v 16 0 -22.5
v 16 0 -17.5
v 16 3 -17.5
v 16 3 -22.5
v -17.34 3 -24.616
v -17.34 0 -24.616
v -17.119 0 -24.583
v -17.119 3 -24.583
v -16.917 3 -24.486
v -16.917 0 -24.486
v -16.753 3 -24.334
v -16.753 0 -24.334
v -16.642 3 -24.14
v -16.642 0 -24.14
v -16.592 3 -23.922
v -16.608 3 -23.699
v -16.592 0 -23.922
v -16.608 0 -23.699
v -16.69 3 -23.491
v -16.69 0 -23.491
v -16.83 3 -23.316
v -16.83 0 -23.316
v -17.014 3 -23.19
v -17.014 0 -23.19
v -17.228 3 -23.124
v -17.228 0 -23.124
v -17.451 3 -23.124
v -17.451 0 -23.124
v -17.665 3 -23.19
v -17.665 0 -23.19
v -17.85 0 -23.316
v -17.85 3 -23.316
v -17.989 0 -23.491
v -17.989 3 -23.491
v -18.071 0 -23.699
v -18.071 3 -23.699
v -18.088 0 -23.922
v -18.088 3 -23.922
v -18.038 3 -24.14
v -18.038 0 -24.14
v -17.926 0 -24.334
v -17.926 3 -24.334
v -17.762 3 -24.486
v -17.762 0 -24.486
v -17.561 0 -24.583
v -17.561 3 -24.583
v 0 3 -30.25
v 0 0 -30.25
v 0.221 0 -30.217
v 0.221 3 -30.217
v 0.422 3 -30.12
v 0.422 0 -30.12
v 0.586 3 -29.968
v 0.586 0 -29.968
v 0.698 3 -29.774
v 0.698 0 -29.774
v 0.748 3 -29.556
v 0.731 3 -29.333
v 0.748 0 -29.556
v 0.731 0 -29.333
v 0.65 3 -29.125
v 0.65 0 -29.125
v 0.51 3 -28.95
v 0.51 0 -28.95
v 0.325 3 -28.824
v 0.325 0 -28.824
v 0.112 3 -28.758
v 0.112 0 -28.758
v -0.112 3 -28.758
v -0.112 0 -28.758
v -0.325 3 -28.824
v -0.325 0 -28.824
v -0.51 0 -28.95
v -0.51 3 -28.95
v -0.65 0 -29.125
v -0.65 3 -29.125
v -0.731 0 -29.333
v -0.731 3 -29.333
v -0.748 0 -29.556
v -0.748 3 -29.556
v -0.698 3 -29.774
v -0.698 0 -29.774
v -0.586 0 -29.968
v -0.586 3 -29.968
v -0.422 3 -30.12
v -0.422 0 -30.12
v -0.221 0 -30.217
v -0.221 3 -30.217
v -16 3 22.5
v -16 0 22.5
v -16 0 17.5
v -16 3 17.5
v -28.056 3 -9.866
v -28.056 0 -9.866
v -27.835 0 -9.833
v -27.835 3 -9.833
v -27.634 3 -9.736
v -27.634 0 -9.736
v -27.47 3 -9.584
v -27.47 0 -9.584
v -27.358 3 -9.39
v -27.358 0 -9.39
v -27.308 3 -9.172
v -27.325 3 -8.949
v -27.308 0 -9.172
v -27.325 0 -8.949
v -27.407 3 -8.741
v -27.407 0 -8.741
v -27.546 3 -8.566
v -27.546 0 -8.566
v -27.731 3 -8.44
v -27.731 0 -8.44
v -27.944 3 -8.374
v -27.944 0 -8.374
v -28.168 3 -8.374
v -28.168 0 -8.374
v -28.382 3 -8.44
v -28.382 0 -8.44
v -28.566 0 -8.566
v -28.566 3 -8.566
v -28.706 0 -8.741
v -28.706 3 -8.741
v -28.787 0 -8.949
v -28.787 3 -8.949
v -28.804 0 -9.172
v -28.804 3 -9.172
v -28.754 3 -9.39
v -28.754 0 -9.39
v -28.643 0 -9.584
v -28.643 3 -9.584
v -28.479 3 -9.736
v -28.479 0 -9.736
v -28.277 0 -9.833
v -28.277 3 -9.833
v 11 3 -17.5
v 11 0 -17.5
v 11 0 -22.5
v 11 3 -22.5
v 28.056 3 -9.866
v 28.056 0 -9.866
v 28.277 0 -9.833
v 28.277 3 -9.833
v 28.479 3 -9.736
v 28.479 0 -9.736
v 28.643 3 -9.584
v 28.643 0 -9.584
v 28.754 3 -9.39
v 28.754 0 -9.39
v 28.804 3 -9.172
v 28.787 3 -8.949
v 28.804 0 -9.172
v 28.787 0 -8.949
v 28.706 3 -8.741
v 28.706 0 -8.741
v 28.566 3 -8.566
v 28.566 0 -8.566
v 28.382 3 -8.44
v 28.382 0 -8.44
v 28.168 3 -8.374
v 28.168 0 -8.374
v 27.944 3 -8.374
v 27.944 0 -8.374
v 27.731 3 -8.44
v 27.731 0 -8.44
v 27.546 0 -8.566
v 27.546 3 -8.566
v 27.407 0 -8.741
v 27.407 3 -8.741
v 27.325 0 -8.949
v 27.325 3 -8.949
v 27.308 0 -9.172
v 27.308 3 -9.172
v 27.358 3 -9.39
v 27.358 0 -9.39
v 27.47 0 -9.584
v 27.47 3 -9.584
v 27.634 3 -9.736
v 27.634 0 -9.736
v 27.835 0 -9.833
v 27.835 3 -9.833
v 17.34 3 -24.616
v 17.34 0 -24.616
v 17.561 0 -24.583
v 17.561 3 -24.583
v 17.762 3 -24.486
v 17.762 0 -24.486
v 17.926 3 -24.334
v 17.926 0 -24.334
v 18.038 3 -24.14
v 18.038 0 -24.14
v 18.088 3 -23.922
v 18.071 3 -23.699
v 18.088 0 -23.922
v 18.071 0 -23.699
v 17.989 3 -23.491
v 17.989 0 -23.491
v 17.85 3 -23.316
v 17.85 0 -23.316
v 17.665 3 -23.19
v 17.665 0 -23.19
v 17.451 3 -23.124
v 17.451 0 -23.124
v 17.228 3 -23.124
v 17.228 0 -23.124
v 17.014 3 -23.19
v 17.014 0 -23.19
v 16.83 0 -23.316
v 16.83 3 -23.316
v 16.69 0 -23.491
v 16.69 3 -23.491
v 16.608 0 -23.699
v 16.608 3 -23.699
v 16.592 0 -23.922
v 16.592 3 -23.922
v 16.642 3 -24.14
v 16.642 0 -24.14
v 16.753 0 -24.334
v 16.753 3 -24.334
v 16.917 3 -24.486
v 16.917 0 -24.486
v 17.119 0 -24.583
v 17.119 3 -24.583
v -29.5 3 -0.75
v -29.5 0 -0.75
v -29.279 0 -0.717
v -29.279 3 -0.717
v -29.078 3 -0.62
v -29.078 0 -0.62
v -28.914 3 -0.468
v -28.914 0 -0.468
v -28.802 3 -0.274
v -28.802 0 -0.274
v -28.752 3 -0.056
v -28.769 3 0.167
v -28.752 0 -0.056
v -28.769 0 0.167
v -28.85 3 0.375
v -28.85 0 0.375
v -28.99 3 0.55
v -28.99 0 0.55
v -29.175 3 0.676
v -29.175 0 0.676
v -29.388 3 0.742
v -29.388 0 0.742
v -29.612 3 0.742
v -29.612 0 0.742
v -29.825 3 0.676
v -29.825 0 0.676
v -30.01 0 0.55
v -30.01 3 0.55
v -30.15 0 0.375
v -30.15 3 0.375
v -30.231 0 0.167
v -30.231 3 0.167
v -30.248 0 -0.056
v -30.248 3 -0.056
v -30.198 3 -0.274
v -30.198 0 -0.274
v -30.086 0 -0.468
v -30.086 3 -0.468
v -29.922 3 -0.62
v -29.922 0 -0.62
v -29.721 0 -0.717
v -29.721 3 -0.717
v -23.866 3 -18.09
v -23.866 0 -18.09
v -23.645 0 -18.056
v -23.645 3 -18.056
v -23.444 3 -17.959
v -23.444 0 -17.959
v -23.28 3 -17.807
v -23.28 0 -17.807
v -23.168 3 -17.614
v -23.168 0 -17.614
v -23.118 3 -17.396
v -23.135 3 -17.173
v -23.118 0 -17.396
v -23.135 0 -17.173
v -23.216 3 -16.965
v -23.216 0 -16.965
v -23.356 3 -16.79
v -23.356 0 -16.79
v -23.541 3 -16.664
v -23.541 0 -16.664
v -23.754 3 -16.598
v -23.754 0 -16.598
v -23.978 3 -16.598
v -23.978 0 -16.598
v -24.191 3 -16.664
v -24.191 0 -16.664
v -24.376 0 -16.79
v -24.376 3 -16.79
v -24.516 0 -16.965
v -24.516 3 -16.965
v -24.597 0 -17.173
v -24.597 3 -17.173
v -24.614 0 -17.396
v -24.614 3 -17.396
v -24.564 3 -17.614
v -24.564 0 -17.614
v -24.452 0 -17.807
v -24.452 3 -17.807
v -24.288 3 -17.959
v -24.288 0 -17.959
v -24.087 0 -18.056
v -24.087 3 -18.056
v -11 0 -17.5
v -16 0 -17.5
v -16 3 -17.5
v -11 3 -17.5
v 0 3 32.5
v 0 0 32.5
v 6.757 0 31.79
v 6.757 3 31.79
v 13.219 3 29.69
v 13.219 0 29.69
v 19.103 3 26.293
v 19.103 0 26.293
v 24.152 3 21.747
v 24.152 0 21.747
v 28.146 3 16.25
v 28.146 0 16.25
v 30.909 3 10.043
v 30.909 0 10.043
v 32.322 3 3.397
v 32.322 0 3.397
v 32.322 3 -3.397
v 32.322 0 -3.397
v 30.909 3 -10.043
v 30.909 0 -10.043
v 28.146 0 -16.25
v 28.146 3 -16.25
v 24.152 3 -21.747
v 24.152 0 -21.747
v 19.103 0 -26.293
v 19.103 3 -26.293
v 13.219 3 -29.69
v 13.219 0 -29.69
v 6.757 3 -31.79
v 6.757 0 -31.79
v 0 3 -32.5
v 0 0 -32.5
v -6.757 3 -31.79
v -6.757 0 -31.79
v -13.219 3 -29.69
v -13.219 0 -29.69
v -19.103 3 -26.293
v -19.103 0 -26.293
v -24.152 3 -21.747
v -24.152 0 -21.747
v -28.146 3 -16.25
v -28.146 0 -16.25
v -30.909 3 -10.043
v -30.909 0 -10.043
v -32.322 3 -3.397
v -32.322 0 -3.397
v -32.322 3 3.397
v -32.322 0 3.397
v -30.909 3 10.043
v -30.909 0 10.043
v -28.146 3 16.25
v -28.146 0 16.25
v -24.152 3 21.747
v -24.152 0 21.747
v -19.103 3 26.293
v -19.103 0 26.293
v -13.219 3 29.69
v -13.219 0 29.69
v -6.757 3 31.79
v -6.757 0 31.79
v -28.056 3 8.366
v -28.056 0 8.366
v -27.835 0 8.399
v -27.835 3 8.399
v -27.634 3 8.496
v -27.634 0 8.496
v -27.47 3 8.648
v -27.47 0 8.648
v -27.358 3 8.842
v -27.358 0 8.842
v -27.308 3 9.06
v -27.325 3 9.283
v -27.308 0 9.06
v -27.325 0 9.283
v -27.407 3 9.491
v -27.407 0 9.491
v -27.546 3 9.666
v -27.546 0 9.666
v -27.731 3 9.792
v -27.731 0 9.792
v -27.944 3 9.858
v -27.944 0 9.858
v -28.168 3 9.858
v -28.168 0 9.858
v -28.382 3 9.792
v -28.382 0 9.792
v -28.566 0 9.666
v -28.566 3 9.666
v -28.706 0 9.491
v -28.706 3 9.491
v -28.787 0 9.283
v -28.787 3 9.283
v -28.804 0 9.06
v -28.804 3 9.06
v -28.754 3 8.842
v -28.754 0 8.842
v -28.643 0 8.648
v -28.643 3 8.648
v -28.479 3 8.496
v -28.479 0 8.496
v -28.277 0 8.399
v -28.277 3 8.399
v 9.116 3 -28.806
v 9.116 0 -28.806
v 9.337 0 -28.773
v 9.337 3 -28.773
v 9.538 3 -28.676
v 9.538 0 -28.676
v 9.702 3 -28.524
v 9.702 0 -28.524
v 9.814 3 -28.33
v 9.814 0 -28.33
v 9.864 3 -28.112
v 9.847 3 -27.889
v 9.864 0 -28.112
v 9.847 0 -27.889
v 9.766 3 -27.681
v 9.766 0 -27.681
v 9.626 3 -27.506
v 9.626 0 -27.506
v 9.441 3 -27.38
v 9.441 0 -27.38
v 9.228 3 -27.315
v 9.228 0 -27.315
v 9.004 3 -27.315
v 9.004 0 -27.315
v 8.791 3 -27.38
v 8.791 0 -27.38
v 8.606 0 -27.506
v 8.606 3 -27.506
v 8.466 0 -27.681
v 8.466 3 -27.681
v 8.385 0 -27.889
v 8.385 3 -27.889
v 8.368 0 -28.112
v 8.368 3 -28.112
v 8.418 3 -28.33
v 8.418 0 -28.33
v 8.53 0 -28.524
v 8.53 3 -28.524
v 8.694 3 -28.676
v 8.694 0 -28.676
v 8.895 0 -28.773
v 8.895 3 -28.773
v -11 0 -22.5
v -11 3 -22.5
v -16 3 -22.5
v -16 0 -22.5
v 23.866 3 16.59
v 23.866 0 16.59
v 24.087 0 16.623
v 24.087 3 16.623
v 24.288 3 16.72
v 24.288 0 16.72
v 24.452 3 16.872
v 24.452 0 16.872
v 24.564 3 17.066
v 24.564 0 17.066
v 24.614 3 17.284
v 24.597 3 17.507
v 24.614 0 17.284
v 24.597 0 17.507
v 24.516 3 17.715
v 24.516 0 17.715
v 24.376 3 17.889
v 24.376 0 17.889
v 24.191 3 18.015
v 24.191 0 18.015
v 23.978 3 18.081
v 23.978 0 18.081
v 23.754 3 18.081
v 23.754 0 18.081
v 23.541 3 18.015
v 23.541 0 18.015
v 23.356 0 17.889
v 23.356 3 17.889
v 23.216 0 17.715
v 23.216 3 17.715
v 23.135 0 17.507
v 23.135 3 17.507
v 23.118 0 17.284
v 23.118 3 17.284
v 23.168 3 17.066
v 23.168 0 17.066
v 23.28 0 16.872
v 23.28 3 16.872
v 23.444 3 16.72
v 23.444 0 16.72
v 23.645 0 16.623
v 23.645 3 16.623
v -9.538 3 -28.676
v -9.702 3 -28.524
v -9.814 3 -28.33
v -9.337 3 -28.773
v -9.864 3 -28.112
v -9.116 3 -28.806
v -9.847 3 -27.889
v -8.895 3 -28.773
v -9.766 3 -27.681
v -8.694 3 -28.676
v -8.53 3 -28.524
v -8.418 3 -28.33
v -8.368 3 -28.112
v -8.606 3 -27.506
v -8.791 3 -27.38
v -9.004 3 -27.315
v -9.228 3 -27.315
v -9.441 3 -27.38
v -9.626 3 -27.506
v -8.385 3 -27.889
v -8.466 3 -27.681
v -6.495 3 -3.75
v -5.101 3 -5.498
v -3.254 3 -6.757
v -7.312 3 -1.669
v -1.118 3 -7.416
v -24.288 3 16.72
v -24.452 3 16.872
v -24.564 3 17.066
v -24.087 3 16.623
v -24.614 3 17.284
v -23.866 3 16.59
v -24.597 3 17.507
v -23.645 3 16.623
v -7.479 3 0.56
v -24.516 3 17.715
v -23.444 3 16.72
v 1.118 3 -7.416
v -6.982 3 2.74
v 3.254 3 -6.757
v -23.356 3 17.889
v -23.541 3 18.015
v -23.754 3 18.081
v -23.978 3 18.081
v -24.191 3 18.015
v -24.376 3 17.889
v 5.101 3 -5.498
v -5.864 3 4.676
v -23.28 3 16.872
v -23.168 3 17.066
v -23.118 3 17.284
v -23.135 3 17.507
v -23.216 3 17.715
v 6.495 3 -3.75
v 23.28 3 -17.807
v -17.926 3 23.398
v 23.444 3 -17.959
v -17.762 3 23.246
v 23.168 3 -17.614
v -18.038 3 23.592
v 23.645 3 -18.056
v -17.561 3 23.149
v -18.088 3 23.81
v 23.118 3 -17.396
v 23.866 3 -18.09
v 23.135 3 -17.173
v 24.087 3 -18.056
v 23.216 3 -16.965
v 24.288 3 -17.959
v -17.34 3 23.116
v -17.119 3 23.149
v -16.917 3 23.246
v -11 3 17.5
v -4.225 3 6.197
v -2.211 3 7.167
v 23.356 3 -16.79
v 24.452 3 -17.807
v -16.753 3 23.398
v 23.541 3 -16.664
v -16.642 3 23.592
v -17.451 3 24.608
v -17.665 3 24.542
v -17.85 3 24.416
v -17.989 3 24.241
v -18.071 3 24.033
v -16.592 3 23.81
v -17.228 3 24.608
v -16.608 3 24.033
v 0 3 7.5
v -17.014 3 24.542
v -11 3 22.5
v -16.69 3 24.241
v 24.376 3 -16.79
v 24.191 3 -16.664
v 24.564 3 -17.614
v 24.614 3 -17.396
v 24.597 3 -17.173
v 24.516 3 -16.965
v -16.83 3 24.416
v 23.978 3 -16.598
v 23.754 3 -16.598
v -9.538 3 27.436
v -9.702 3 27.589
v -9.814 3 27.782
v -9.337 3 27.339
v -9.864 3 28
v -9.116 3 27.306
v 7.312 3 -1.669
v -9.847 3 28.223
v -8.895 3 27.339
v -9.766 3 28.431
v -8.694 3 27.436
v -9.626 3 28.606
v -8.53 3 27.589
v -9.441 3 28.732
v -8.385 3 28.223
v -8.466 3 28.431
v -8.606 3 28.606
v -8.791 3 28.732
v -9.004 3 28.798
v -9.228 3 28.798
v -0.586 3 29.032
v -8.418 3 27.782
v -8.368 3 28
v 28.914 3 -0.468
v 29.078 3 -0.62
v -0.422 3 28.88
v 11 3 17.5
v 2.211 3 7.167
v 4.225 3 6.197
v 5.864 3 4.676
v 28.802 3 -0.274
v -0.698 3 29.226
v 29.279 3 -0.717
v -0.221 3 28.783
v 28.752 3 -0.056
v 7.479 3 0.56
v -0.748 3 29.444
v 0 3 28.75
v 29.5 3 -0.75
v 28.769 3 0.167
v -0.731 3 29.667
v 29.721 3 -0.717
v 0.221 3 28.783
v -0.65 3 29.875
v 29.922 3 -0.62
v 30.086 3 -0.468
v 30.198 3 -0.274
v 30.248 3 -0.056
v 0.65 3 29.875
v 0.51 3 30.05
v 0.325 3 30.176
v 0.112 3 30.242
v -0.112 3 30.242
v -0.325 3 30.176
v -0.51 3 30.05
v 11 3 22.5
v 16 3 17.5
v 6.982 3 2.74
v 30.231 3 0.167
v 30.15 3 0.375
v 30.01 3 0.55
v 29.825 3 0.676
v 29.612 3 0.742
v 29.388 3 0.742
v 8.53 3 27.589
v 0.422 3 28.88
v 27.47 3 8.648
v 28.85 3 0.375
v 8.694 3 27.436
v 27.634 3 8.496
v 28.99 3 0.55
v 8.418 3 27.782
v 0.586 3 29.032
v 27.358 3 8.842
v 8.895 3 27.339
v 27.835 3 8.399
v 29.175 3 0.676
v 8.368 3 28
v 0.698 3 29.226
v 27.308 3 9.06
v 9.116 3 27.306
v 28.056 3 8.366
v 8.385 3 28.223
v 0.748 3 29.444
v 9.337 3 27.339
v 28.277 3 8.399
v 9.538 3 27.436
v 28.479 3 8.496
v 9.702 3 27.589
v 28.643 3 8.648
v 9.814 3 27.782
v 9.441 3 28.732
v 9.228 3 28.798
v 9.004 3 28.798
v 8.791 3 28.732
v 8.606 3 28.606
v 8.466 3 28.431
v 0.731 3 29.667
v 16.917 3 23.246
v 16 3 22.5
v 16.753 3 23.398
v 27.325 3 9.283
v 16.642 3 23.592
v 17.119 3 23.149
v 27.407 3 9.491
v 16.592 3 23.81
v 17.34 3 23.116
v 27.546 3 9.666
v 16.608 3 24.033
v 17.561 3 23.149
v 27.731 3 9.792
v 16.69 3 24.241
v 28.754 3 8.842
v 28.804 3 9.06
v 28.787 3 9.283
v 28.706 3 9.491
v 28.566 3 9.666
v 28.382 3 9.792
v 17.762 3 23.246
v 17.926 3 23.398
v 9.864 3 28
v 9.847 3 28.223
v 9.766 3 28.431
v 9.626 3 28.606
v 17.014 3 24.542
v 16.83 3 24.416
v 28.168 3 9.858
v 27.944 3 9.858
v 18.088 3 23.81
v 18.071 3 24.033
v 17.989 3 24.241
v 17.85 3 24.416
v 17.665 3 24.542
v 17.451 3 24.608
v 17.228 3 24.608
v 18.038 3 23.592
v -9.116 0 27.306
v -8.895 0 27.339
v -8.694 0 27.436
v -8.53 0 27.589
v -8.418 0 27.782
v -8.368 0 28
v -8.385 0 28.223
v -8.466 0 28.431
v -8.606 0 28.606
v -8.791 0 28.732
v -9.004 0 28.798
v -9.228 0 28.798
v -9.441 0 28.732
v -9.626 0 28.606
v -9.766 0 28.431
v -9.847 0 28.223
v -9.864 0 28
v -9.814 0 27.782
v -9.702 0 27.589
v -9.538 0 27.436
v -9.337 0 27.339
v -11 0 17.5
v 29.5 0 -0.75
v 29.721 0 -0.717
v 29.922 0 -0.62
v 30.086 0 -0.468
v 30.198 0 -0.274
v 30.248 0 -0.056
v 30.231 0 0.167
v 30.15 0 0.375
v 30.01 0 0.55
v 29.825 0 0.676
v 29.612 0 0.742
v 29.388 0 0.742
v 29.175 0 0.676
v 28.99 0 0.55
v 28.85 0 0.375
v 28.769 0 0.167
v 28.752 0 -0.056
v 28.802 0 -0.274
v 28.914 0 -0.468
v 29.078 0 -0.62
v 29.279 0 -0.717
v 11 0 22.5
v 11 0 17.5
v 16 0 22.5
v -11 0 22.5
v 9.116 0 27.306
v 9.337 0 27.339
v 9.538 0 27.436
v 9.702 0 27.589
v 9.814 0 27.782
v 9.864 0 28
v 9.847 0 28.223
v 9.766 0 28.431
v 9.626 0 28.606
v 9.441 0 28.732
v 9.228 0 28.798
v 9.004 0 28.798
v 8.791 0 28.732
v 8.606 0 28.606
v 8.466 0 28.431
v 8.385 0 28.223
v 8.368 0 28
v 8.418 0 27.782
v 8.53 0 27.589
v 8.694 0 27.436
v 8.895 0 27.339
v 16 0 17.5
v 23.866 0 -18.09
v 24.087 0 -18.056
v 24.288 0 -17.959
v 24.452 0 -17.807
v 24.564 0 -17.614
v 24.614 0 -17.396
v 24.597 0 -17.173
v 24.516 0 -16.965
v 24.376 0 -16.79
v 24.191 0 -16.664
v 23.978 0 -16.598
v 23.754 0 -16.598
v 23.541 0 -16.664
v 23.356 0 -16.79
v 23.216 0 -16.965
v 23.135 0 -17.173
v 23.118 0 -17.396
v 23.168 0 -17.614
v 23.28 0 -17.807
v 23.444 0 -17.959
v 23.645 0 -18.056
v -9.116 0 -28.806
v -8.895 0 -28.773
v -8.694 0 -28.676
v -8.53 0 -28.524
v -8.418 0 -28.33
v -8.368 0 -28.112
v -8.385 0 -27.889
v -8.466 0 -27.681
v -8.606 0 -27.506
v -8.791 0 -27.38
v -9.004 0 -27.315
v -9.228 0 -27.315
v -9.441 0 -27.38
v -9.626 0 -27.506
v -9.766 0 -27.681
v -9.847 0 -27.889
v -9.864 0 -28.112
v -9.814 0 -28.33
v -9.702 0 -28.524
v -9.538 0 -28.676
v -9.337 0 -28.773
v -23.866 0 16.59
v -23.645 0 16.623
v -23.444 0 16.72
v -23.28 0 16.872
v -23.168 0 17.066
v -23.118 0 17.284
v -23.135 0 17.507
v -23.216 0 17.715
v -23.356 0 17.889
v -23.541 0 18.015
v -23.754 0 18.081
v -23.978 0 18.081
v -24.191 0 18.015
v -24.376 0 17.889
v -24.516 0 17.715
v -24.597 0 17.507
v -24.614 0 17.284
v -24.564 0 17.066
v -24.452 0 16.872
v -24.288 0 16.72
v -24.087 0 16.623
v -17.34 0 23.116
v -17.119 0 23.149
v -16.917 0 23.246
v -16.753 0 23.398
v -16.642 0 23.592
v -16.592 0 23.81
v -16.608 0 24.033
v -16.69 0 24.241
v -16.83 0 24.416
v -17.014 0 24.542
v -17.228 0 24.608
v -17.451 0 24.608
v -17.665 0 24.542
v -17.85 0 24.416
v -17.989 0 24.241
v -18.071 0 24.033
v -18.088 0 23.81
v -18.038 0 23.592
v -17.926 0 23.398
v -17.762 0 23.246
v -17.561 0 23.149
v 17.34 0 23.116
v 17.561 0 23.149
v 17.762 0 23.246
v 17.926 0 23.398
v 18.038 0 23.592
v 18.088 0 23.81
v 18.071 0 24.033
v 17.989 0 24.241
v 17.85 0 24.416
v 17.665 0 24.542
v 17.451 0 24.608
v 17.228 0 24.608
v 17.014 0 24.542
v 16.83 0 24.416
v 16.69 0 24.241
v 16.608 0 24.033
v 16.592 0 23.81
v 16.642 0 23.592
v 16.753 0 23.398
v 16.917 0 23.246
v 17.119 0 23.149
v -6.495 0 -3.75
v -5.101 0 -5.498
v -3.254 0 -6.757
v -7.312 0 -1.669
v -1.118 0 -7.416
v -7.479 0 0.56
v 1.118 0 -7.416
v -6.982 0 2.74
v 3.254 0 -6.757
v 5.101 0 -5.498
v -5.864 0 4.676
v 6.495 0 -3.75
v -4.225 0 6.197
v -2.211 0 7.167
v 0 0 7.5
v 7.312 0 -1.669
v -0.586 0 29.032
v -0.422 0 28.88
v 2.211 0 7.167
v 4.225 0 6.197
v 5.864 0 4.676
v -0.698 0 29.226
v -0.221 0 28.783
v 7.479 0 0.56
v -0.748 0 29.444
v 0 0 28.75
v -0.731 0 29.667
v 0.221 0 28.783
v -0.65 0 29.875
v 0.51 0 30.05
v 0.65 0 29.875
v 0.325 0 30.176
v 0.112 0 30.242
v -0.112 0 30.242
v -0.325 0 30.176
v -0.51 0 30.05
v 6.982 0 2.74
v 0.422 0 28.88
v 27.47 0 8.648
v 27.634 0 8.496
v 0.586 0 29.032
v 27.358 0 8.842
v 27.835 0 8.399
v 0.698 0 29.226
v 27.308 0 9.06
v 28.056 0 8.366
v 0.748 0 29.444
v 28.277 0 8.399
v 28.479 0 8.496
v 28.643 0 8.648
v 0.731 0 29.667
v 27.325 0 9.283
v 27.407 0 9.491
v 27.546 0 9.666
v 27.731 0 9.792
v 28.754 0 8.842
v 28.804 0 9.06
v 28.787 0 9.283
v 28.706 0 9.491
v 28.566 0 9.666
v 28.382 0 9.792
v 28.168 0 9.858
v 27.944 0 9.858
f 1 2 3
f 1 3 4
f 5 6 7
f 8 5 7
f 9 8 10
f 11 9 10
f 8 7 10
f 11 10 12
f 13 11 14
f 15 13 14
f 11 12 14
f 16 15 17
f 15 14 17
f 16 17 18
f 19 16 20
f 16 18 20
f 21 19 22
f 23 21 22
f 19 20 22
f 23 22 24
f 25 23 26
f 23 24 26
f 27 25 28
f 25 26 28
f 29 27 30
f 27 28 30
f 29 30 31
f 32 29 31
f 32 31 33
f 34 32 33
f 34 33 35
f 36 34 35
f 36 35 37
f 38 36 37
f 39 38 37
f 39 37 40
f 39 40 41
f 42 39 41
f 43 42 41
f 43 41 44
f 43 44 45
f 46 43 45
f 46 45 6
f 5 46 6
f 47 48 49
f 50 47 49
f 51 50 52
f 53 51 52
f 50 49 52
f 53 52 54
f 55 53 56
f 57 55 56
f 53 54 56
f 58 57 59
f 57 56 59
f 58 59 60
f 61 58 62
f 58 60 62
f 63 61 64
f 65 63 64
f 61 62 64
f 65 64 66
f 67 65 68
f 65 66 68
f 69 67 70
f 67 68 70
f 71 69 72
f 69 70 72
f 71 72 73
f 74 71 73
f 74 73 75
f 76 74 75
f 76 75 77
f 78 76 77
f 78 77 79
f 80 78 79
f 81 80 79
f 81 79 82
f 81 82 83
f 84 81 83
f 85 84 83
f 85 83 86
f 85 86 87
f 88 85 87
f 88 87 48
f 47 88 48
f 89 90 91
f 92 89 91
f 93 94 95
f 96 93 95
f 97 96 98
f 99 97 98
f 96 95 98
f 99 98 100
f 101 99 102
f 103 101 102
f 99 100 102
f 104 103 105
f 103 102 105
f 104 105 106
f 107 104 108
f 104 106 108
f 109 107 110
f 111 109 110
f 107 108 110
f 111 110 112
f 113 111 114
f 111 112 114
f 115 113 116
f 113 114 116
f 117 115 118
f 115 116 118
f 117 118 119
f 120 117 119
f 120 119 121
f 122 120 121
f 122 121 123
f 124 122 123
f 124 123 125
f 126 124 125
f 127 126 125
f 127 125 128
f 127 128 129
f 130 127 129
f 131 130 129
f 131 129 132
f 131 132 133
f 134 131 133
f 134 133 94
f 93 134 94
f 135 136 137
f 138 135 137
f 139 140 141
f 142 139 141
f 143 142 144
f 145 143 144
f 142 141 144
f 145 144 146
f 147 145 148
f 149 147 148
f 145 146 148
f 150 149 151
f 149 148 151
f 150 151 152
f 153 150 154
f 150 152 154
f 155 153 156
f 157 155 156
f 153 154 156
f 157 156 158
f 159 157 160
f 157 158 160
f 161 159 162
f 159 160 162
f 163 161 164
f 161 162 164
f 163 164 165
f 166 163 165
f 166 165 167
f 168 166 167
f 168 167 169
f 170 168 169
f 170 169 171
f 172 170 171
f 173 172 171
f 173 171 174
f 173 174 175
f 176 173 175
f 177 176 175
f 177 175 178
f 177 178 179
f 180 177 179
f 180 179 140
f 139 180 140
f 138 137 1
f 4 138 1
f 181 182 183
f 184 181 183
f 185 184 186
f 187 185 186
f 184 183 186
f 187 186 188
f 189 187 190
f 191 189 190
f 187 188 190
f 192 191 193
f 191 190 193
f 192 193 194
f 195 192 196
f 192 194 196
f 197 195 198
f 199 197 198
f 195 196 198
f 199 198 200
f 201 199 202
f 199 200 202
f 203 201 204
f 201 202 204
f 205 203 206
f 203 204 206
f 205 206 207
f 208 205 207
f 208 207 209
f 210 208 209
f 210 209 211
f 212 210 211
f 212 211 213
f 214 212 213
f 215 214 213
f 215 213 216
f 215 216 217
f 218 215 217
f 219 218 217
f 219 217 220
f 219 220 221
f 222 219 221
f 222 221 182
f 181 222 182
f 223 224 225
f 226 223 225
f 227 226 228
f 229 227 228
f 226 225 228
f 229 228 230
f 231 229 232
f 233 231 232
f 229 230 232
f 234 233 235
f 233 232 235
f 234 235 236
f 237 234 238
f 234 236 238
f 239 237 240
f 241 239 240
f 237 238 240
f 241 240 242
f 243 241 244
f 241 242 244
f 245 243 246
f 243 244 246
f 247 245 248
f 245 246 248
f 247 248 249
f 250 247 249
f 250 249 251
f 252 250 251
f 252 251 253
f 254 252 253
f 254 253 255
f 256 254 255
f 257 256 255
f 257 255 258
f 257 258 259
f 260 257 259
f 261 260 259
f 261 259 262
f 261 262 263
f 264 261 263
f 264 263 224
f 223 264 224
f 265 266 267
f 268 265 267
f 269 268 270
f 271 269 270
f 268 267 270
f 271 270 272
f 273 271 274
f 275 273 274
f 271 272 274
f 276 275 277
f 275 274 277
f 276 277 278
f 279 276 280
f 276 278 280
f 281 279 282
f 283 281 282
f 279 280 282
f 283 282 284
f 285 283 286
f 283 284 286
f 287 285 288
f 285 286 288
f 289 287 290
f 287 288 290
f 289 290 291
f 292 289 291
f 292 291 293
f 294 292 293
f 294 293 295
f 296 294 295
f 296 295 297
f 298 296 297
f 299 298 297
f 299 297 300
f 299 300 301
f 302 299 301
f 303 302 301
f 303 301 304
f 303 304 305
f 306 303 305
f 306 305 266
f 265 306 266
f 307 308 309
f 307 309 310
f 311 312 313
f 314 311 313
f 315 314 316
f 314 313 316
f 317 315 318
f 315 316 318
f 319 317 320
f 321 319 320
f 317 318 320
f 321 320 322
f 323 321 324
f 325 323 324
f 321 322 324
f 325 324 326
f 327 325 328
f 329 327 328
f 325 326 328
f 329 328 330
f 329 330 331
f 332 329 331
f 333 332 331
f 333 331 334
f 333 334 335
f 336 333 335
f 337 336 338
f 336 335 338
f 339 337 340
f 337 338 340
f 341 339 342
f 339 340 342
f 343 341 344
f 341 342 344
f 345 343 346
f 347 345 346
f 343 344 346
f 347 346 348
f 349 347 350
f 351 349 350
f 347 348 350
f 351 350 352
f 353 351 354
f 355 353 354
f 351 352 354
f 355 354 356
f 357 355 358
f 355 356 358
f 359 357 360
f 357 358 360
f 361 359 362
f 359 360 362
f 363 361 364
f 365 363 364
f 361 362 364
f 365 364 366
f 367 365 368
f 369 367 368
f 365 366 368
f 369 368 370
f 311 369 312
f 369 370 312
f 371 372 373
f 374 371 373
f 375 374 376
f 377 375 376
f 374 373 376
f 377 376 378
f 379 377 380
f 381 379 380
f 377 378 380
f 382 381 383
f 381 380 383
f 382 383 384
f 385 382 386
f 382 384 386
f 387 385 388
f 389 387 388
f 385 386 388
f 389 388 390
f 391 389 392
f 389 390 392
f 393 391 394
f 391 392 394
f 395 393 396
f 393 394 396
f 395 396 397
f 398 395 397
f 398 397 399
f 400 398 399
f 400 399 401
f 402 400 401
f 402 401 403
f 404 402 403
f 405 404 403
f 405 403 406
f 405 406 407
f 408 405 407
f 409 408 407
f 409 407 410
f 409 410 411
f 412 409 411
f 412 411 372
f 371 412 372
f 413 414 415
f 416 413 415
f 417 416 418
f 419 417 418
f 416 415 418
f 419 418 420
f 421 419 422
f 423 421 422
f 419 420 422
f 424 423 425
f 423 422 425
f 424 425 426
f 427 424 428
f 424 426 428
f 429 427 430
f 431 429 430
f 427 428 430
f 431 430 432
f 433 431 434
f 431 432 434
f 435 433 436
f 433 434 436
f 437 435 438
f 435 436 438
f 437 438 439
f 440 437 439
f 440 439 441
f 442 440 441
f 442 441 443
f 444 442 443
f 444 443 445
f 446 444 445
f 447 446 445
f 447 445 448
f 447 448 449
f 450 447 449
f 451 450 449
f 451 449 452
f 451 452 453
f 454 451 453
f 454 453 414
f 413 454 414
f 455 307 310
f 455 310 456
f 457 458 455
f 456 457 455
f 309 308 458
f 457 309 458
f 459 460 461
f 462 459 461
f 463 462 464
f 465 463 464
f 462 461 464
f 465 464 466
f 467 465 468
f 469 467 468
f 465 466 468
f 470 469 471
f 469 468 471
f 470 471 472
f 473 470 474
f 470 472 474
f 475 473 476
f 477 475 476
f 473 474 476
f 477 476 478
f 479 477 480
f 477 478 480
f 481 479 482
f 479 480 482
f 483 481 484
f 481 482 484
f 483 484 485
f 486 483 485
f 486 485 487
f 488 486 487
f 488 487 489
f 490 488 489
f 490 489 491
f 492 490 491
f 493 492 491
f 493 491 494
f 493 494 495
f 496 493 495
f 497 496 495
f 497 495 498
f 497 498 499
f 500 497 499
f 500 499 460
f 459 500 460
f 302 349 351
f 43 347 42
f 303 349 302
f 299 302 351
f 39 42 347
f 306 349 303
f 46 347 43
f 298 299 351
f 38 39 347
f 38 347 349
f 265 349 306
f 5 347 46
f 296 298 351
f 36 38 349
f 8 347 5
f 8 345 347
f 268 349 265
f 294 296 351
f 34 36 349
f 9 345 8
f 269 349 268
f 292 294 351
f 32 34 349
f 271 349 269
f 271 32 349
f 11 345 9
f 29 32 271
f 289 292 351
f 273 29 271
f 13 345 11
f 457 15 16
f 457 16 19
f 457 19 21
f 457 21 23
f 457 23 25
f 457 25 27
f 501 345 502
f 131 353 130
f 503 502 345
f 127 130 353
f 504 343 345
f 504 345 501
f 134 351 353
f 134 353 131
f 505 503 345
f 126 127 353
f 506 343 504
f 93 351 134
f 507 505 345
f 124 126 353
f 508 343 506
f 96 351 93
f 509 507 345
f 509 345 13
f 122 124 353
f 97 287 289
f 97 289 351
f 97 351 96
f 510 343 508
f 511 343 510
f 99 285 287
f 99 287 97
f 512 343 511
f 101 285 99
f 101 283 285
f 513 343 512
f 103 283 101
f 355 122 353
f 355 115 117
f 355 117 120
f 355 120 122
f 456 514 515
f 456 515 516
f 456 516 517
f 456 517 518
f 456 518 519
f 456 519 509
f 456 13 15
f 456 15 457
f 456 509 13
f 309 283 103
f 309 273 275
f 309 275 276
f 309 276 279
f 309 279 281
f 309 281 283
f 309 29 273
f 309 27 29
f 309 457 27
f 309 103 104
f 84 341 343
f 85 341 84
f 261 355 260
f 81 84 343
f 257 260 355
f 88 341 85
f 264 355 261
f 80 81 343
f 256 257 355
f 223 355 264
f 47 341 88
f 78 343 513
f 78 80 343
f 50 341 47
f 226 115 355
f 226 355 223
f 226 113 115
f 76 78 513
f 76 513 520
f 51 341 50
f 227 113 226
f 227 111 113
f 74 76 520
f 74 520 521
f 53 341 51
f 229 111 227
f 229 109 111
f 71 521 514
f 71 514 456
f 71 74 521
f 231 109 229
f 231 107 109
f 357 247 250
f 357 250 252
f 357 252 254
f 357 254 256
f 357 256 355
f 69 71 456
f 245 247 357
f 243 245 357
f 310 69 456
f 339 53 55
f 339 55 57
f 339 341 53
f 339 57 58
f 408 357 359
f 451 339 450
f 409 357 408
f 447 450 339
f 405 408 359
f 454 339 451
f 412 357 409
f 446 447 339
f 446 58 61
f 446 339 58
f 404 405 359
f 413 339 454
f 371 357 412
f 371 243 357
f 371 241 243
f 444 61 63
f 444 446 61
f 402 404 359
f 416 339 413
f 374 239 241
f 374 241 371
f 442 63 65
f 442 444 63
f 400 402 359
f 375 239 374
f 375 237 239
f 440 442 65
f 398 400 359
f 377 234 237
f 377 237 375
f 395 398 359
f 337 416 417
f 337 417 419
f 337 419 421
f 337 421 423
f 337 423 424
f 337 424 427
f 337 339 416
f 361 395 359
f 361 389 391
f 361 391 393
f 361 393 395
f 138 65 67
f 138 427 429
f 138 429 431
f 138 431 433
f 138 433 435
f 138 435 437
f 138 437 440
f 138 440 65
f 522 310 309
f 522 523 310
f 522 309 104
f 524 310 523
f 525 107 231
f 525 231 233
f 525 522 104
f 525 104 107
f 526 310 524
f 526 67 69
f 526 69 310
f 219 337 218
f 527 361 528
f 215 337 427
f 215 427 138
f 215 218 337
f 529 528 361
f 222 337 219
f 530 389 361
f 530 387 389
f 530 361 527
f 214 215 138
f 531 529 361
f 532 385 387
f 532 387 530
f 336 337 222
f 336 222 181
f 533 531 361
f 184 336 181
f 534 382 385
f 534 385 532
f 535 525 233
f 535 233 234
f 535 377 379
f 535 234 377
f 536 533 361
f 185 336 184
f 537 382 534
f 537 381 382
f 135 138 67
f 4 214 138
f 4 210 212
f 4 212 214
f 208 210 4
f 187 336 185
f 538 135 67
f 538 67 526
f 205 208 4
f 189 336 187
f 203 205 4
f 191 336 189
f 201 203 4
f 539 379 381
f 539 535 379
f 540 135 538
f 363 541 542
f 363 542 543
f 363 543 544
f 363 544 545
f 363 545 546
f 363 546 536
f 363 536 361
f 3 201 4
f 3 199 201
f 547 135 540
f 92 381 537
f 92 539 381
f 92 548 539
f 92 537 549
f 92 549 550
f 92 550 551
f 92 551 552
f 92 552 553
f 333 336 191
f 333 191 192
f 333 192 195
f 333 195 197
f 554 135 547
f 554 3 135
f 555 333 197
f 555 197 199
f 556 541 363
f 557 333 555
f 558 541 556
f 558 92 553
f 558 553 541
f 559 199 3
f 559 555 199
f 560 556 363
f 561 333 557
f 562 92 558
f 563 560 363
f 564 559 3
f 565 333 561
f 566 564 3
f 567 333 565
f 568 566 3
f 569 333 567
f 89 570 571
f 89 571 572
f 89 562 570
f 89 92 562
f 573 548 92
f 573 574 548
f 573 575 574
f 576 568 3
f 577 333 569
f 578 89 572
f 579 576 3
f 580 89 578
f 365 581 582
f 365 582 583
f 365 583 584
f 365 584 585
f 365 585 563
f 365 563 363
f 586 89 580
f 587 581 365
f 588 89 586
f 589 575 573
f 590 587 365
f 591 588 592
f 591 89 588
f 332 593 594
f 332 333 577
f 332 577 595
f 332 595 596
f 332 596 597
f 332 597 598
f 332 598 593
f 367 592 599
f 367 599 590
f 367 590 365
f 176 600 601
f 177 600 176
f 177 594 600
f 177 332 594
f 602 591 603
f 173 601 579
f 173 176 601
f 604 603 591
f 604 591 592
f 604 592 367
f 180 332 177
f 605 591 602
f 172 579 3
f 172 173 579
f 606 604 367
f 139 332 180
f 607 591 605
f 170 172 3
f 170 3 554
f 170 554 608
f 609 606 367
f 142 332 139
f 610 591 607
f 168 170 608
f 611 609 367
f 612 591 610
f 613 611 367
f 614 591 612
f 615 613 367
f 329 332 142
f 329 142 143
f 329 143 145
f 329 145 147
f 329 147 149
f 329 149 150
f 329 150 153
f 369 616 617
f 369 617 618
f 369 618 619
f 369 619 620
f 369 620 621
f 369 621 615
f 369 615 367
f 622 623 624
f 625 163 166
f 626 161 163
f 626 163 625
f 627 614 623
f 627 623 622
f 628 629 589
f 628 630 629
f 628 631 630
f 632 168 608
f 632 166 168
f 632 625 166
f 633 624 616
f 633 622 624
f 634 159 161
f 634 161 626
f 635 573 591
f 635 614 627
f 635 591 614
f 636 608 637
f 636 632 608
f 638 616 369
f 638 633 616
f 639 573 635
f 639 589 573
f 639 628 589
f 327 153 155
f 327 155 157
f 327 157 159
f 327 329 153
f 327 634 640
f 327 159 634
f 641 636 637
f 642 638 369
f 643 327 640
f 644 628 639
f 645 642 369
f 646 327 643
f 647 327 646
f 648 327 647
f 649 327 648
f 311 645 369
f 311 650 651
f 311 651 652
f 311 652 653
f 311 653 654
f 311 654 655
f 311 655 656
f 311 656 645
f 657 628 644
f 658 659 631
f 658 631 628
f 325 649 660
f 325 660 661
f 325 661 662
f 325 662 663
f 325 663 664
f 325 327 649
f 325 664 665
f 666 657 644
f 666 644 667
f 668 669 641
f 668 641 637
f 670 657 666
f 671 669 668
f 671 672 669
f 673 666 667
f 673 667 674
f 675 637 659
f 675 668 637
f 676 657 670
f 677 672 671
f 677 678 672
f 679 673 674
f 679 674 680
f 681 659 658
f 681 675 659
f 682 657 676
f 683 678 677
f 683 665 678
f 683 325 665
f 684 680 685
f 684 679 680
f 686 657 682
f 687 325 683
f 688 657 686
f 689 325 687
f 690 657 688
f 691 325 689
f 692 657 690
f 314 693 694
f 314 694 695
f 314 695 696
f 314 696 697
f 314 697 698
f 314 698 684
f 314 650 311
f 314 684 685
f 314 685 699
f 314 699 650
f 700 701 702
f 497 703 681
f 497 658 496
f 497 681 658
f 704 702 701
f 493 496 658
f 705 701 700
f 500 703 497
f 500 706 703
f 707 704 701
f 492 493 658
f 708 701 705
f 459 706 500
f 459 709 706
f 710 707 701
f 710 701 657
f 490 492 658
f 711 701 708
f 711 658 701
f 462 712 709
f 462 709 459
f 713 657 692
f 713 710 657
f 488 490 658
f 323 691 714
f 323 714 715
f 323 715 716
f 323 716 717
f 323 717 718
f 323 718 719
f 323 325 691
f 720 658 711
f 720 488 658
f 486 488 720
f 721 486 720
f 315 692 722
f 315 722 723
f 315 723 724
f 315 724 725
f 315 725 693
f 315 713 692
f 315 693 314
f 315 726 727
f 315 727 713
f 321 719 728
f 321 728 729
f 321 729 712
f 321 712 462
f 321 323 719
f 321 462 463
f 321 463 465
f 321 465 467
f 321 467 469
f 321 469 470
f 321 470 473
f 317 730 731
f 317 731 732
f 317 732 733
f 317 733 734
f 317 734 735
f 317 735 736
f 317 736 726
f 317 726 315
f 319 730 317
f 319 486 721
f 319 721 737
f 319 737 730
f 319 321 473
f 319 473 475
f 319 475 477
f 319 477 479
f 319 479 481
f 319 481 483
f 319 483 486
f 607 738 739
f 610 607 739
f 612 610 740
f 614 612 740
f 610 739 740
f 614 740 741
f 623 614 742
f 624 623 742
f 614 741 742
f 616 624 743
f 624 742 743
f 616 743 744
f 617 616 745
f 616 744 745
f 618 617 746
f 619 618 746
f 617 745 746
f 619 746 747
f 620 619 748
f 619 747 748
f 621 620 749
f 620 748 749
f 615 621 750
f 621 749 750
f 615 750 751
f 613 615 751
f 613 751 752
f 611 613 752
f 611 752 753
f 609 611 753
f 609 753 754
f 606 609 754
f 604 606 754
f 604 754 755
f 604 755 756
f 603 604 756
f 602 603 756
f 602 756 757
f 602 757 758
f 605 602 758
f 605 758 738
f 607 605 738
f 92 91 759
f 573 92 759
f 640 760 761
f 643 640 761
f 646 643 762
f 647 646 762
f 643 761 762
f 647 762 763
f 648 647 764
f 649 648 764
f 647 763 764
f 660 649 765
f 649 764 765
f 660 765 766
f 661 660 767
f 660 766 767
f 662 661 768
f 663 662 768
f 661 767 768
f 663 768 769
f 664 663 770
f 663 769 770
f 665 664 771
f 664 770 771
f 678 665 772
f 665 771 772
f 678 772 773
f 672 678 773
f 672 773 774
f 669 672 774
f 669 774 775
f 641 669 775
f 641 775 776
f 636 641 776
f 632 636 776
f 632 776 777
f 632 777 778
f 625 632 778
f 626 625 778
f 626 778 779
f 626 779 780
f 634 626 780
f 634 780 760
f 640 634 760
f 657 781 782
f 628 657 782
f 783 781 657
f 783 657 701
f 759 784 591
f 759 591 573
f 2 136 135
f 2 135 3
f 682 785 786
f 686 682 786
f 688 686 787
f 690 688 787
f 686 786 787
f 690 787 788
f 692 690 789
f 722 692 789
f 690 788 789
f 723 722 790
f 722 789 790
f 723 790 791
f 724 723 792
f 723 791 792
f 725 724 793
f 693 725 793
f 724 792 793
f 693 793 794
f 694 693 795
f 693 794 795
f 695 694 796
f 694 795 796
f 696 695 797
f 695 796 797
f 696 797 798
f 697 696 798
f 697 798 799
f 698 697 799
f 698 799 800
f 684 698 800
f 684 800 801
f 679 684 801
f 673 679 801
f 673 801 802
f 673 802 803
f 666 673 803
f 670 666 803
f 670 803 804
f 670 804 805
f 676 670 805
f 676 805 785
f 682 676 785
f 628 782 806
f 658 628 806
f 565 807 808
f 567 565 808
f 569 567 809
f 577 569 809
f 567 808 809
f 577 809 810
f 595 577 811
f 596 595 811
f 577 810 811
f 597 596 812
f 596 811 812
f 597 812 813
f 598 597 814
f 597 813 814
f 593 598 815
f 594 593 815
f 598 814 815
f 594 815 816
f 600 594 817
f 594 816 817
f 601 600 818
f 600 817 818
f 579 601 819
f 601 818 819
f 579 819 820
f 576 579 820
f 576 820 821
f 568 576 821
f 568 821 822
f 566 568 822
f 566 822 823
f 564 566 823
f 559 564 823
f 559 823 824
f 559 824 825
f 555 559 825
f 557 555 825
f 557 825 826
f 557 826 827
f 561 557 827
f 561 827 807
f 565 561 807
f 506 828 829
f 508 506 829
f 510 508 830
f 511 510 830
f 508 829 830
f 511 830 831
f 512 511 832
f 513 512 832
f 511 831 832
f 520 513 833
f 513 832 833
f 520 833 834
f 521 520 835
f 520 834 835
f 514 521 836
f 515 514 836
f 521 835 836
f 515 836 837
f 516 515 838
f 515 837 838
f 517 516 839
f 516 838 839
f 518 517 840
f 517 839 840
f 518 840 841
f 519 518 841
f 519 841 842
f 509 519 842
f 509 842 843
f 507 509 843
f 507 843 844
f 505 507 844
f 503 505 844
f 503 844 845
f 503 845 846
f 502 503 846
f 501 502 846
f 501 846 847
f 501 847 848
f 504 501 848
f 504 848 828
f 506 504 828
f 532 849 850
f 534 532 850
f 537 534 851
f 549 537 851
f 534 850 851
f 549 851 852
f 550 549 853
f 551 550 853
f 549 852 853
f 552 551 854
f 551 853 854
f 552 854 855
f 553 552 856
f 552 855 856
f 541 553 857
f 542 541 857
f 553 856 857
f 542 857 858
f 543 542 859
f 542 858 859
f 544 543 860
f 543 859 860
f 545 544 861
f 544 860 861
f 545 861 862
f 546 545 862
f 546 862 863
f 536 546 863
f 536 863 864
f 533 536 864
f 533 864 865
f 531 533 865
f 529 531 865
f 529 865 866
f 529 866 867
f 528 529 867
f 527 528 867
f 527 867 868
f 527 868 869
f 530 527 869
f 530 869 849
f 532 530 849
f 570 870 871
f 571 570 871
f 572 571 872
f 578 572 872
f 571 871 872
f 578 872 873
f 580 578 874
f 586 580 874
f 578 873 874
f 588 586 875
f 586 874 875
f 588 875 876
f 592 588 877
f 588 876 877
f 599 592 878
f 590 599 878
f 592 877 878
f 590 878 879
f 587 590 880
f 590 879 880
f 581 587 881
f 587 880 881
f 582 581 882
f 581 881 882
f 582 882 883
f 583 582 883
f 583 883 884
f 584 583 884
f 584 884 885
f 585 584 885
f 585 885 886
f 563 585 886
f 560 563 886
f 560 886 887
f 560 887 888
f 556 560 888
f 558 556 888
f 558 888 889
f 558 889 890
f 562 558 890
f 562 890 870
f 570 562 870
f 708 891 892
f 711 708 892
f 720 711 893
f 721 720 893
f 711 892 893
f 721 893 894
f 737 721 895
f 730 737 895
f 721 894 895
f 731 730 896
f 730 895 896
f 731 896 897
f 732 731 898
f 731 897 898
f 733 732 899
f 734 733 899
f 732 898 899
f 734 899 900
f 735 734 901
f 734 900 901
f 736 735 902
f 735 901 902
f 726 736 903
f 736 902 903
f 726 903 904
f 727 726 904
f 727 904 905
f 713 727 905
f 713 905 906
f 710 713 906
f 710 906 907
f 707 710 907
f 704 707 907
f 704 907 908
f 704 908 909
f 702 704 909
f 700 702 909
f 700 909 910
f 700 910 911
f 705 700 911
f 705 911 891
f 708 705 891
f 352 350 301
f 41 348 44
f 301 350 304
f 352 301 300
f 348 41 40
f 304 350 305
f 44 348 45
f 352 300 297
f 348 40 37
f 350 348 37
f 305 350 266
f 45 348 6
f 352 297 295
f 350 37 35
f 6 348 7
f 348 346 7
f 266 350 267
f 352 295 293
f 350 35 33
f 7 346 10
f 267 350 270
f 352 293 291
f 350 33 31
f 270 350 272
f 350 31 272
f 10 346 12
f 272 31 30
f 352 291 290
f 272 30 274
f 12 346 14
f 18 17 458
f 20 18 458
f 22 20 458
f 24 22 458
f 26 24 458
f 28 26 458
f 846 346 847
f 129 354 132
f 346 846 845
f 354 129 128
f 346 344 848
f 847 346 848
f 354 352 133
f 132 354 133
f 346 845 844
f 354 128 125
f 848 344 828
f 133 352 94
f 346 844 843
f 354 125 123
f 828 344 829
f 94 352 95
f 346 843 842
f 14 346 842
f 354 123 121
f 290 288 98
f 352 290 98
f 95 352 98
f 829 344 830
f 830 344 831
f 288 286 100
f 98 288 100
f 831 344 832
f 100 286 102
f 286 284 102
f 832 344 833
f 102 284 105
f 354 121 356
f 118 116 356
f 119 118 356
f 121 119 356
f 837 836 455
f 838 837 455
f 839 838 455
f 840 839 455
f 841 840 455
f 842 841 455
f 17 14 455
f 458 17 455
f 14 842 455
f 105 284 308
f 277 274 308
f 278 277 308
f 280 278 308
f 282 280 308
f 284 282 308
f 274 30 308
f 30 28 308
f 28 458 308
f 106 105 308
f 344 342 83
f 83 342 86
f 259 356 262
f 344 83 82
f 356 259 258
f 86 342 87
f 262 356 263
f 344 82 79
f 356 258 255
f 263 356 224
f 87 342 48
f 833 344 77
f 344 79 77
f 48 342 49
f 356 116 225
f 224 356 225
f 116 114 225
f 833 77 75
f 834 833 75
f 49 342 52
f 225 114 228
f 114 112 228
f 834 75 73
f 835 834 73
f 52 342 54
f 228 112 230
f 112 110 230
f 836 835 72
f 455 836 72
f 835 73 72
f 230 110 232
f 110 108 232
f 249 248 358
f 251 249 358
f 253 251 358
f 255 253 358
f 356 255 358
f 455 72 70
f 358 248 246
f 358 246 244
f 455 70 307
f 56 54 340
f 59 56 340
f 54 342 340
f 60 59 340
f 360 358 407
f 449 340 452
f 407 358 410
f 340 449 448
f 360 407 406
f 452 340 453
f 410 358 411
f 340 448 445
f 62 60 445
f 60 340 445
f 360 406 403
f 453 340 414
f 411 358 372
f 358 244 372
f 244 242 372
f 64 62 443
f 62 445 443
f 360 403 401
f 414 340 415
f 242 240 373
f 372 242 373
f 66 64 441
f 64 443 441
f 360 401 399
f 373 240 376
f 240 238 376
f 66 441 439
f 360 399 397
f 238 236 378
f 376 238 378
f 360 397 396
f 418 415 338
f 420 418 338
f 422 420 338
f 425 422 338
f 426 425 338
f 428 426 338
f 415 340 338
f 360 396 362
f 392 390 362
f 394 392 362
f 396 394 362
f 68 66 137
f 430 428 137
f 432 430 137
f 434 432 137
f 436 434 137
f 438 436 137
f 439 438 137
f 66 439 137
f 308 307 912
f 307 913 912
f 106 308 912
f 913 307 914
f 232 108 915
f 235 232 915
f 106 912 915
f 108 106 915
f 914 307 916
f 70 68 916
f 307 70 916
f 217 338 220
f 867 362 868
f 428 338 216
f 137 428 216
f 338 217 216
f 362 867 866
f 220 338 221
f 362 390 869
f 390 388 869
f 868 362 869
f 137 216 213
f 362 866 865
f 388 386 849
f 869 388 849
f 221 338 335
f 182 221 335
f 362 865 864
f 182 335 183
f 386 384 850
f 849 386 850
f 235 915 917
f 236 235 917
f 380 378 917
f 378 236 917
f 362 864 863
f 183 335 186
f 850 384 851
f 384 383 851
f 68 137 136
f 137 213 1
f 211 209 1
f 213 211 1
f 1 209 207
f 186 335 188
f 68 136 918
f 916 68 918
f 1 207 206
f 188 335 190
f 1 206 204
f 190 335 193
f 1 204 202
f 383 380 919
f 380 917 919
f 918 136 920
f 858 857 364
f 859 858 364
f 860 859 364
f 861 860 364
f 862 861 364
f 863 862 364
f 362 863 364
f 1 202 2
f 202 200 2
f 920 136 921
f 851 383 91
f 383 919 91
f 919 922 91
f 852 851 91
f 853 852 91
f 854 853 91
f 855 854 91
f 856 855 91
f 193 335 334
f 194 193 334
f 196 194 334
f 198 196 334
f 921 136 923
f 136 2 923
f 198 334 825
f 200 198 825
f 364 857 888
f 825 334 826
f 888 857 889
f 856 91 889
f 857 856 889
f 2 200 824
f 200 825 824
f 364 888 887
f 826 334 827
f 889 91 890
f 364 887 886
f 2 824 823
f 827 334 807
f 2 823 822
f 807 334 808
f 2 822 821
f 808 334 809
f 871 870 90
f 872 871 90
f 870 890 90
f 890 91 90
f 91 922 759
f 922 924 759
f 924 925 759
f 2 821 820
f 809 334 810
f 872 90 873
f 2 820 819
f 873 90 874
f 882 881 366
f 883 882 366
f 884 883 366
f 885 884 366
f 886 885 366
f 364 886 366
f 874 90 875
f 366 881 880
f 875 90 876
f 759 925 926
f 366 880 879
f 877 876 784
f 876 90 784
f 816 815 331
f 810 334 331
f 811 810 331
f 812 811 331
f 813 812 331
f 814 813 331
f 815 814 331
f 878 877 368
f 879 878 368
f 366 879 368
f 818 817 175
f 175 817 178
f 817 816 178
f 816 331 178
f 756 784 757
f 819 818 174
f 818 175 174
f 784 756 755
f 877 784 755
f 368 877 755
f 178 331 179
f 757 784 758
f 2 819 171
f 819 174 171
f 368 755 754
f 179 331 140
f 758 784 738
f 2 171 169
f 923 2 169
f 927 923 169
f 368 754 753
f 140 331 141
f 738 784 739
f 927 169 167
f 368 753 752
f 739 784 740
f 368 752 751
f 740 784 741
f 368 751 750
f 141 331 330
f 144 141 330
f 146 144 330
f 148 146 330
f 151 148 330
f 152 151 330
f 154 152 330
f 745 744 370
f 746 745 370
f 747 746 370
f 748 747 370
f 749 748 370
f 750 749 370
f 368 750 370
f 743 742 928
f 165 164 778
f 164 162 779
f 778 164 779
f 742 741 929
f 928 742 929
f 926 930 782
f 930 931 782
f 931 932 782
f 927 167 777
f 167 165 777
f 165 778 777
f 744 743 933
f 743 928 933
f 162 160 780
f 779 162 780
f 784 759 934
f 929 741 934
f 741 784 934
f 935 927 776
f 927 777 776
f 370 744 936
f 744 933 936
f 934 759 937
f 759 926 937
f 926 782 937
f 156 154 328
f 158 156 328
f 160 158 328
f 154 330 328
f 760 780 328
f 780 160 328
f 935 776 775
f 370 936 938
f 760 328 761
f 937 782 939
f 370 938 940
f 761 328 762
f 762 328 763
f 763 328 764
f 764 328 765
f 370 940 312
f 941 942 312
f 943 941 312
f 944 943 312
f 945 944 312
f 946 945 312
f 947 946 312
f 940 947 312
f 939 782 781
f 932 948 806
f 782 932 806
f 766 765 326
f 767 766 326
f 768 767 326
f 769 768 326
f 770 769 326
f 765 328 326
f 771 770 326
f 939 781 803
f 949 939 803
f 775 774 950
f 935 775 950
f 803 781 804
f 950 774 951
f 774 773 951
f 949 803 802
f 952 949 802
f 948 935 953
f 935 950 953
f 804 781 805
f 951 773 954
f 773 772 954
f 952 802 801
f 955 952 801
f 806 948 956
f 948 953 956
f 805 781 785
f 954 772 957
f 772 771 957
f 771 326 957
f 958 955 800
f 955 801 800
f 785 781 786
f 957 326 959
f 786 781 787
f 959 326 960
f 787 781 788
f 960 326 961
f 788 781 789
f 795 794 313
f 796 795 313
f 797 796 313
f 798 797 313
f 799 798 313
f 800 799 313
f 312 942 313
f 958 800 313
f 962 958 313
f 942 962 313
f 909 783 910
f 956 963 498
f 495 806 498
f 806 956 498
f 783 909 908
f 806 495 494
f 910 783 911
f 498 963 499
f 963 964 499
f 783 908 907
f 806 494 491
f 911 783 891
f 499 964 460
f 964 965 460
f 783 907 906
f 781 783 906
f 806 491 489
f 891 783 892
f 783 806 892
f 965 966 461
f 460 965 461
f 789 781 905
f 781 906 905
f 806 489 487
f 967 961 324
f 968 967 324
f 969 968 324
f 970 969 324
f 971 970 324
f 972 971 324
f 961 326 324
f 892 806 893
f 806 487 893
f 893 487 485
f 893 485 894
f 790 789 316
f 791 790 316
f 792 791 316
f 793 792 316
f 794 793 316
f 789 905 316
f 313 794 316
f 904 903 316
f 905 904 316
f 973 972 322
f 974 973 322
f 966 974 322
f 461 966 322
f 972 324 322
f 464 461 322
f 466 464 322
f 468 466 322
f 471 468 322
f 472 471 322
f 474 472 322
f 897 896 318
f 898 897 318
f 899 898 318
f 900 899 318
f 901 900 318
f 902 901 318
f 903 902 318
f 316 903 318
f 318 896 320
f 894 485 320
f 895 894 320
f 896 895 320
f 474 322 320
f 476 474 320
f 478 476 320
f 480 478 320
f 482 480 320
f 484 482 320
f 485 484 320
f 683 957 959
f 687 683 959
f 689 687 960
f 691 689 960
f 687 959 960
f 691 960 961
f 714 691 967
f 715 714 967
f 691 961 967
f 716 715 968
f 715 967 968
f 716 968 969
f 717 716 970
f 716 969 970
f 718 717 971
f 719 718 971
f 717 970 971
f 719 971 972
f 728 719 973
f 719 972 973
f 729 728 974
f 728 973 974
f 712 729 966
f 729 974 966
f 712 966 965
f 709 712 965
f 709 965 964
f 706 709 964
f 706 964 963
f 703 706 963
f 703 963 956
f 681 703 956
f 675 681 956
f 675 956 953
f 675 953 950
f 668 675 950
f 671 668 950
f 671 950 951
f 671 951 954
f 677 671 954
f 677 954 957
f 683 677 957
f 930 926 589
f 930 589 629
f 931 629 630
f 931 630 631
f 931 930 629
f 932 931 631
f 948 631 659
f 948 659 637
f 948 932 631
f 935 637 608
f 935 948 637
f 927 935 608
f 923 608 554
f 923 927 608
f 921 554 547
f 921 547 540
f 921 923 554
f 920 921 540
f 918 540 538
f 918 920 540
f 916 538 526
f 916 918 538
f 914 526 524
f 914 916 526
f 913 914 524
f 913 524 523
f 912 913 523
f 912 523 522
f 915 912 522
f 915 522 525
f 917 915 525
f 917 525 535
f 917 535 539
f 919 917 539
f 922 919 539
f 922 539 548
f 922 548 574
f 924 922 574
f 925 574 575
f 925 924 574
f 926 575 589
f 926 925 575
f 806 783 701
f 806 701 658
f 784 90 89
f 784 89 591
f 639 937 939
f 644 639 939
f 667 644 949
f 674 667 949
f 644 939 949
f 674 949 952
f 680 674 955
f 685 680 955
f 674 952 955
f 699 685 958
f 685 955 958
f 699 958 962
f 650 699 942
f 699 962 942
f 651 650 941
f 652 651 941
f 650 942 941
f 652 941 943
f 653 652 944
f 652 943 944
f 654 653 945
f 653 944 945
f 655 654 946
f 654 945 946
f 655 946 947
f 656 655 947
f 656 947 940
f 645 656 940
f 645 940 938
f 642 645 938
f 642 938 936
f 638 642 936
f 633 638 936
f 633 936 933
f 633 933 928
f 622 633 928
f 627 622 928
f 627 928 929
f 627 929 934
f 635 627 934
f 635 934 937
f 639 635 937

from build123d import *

# Parameters (mm, degrees)
SKETCH1_R           = 32.5
SKETCH1_R_2         = 7.5
SKETCH1_W           = 5
SKETCH1_H           = 5
BOSS_EXTRUDE1_DEPTH = 3
SKETCH2_R           = 0.75
CUT_EXTRUDE1_DEPTH  = 47.059743812


with BuildPart() as part:
    # Sketch1 → Boss-Extrude1 (new body)
    with BuildSketch(Plane(origin=(0, 0, 0), x_dir=(1, 0, 0), z_dir=(0, 1, 0))):
        with Locations(Location((0, 0, 0), (0, 0, 270))):
            Circle(SKETCH1_R)
        with Locations(Location((0, 0, 0), (0, 0, 270))):
            Circle(SKETCH1_R_2, mode=Mode.SUBTRACT)
        with Locations((-13.5, -20)):
            Rectangle(SKETCH1_W, SKETCH1_H, mode=Mode.SUBTRACT)
        with Locations((-13.5, 20)):
            Rectangle(SKETCH1_W, SKETCH1_H, mode=Mode.SUBTRACT)
        with Locations((13.5, 20)):
            Rectangle(SKETCH1_W, SKETCH1_H, mode=Mode.SUBTRACT)
        with Locations((13.5, -20)):
            Rectangle(SKETCH1_W, SKETCH1_H, mode=Mode.SUBTRACT)
    extrude(amount=BOSS_EXTRUDE1_DEPTH)

    # Sketch2 → Cut-Extrude1 (cut, through all)
    with BuildSketch(Plane.XZ):
        with Locations(Location((0, -29.5, 0), (0, 0, 270))):
            Circle(SKETCH2_R)
        with Locations(Location((-9.116001334, -28.056167231, 0), (0, 0, 270))):
            Circle(SKETCH2_R)
        with Locations(Location((-17.339664943, -23.866001334, 0), (0, 0, 270))):
            Circle(SKETCH2_R)
        with Locations(Location((-23.866001334, -17.339664943, 0), (0, 0, 270))):
            Circle(SKETCH2_R)
        with Locations(Location((-28.056167231, -9.116001334, 0), (0, 0, 270))):
            Circle(SKETCH2_R)
        with Locations(Location((-29.5, 0, 0), (0, 0, 270))):
            Circle(SKETCH2_R)
        with Locations(Location((-28.056167231, 9.116001334, 0), (0, 0, 270))):
            Circle(SKETCH2_R)
        with Locations(Location((-23.866001334, 17.339664943, 0), (0, 0, 270))):
            Circle(SKETCH2_R)
        with Locations(Location((-17.339664943, 23.866001334, 0), (0, 0, 270))):
            Circle(SKETCH2_R)
        with Locations(Location((-9.116001334, 28.056167231, 0), (0, 0, 270))):
            Circle(SKETCH2_R)
        with Locations(Location((0, 29.5, 0), (0, 0, 270))):
            Circle(SKETCH2_R)
        with Locations(Location((9.116001334, 28.056167231, 0), (0, 0, 270))):
            Circle(SKETCH2_R)
        with Locations(Location((17.339664943, 23.866001334, 0), (0, 0, 270))):
            Circle(SKETCH2_R)
        with Locations(Location((23.866001334, 17.339664943, 0), (0, 0, 270))):
            Circle(SKETCH2_R)
        with Locations(Location((28.056167231, 9.116001334, 0), (0, 0, 270))):
            Circle(SKETCH2_R)
        with Locations(Location((29.5, 0, 0), (0, 0, 270))):
            Circle(SKETCH2_R)
        with Locations(Location((28.056167231, -9.116001334, 0), (0, 0, 270))):
            Circle(SKETCH2_R)
        with Locations(Location((23.866001334, -17.339664943, 0), (0, 0, 270))):
            Circle(SKETCH2_R)
        with Locations(Location((17.339664943, -23.866001334, 0), (0, 0, 270))):
            Circle(SKETCH2_R)
        with Locations(Location((9.116001334, -28.056167231, 0), (0, 0, 270))):
            Circle(SKETCH2_R)
    extrude(amount=-CUT_EXTRUDE1_DEPTH, mode=Mode.SUBTRACT)


solid = part.part
